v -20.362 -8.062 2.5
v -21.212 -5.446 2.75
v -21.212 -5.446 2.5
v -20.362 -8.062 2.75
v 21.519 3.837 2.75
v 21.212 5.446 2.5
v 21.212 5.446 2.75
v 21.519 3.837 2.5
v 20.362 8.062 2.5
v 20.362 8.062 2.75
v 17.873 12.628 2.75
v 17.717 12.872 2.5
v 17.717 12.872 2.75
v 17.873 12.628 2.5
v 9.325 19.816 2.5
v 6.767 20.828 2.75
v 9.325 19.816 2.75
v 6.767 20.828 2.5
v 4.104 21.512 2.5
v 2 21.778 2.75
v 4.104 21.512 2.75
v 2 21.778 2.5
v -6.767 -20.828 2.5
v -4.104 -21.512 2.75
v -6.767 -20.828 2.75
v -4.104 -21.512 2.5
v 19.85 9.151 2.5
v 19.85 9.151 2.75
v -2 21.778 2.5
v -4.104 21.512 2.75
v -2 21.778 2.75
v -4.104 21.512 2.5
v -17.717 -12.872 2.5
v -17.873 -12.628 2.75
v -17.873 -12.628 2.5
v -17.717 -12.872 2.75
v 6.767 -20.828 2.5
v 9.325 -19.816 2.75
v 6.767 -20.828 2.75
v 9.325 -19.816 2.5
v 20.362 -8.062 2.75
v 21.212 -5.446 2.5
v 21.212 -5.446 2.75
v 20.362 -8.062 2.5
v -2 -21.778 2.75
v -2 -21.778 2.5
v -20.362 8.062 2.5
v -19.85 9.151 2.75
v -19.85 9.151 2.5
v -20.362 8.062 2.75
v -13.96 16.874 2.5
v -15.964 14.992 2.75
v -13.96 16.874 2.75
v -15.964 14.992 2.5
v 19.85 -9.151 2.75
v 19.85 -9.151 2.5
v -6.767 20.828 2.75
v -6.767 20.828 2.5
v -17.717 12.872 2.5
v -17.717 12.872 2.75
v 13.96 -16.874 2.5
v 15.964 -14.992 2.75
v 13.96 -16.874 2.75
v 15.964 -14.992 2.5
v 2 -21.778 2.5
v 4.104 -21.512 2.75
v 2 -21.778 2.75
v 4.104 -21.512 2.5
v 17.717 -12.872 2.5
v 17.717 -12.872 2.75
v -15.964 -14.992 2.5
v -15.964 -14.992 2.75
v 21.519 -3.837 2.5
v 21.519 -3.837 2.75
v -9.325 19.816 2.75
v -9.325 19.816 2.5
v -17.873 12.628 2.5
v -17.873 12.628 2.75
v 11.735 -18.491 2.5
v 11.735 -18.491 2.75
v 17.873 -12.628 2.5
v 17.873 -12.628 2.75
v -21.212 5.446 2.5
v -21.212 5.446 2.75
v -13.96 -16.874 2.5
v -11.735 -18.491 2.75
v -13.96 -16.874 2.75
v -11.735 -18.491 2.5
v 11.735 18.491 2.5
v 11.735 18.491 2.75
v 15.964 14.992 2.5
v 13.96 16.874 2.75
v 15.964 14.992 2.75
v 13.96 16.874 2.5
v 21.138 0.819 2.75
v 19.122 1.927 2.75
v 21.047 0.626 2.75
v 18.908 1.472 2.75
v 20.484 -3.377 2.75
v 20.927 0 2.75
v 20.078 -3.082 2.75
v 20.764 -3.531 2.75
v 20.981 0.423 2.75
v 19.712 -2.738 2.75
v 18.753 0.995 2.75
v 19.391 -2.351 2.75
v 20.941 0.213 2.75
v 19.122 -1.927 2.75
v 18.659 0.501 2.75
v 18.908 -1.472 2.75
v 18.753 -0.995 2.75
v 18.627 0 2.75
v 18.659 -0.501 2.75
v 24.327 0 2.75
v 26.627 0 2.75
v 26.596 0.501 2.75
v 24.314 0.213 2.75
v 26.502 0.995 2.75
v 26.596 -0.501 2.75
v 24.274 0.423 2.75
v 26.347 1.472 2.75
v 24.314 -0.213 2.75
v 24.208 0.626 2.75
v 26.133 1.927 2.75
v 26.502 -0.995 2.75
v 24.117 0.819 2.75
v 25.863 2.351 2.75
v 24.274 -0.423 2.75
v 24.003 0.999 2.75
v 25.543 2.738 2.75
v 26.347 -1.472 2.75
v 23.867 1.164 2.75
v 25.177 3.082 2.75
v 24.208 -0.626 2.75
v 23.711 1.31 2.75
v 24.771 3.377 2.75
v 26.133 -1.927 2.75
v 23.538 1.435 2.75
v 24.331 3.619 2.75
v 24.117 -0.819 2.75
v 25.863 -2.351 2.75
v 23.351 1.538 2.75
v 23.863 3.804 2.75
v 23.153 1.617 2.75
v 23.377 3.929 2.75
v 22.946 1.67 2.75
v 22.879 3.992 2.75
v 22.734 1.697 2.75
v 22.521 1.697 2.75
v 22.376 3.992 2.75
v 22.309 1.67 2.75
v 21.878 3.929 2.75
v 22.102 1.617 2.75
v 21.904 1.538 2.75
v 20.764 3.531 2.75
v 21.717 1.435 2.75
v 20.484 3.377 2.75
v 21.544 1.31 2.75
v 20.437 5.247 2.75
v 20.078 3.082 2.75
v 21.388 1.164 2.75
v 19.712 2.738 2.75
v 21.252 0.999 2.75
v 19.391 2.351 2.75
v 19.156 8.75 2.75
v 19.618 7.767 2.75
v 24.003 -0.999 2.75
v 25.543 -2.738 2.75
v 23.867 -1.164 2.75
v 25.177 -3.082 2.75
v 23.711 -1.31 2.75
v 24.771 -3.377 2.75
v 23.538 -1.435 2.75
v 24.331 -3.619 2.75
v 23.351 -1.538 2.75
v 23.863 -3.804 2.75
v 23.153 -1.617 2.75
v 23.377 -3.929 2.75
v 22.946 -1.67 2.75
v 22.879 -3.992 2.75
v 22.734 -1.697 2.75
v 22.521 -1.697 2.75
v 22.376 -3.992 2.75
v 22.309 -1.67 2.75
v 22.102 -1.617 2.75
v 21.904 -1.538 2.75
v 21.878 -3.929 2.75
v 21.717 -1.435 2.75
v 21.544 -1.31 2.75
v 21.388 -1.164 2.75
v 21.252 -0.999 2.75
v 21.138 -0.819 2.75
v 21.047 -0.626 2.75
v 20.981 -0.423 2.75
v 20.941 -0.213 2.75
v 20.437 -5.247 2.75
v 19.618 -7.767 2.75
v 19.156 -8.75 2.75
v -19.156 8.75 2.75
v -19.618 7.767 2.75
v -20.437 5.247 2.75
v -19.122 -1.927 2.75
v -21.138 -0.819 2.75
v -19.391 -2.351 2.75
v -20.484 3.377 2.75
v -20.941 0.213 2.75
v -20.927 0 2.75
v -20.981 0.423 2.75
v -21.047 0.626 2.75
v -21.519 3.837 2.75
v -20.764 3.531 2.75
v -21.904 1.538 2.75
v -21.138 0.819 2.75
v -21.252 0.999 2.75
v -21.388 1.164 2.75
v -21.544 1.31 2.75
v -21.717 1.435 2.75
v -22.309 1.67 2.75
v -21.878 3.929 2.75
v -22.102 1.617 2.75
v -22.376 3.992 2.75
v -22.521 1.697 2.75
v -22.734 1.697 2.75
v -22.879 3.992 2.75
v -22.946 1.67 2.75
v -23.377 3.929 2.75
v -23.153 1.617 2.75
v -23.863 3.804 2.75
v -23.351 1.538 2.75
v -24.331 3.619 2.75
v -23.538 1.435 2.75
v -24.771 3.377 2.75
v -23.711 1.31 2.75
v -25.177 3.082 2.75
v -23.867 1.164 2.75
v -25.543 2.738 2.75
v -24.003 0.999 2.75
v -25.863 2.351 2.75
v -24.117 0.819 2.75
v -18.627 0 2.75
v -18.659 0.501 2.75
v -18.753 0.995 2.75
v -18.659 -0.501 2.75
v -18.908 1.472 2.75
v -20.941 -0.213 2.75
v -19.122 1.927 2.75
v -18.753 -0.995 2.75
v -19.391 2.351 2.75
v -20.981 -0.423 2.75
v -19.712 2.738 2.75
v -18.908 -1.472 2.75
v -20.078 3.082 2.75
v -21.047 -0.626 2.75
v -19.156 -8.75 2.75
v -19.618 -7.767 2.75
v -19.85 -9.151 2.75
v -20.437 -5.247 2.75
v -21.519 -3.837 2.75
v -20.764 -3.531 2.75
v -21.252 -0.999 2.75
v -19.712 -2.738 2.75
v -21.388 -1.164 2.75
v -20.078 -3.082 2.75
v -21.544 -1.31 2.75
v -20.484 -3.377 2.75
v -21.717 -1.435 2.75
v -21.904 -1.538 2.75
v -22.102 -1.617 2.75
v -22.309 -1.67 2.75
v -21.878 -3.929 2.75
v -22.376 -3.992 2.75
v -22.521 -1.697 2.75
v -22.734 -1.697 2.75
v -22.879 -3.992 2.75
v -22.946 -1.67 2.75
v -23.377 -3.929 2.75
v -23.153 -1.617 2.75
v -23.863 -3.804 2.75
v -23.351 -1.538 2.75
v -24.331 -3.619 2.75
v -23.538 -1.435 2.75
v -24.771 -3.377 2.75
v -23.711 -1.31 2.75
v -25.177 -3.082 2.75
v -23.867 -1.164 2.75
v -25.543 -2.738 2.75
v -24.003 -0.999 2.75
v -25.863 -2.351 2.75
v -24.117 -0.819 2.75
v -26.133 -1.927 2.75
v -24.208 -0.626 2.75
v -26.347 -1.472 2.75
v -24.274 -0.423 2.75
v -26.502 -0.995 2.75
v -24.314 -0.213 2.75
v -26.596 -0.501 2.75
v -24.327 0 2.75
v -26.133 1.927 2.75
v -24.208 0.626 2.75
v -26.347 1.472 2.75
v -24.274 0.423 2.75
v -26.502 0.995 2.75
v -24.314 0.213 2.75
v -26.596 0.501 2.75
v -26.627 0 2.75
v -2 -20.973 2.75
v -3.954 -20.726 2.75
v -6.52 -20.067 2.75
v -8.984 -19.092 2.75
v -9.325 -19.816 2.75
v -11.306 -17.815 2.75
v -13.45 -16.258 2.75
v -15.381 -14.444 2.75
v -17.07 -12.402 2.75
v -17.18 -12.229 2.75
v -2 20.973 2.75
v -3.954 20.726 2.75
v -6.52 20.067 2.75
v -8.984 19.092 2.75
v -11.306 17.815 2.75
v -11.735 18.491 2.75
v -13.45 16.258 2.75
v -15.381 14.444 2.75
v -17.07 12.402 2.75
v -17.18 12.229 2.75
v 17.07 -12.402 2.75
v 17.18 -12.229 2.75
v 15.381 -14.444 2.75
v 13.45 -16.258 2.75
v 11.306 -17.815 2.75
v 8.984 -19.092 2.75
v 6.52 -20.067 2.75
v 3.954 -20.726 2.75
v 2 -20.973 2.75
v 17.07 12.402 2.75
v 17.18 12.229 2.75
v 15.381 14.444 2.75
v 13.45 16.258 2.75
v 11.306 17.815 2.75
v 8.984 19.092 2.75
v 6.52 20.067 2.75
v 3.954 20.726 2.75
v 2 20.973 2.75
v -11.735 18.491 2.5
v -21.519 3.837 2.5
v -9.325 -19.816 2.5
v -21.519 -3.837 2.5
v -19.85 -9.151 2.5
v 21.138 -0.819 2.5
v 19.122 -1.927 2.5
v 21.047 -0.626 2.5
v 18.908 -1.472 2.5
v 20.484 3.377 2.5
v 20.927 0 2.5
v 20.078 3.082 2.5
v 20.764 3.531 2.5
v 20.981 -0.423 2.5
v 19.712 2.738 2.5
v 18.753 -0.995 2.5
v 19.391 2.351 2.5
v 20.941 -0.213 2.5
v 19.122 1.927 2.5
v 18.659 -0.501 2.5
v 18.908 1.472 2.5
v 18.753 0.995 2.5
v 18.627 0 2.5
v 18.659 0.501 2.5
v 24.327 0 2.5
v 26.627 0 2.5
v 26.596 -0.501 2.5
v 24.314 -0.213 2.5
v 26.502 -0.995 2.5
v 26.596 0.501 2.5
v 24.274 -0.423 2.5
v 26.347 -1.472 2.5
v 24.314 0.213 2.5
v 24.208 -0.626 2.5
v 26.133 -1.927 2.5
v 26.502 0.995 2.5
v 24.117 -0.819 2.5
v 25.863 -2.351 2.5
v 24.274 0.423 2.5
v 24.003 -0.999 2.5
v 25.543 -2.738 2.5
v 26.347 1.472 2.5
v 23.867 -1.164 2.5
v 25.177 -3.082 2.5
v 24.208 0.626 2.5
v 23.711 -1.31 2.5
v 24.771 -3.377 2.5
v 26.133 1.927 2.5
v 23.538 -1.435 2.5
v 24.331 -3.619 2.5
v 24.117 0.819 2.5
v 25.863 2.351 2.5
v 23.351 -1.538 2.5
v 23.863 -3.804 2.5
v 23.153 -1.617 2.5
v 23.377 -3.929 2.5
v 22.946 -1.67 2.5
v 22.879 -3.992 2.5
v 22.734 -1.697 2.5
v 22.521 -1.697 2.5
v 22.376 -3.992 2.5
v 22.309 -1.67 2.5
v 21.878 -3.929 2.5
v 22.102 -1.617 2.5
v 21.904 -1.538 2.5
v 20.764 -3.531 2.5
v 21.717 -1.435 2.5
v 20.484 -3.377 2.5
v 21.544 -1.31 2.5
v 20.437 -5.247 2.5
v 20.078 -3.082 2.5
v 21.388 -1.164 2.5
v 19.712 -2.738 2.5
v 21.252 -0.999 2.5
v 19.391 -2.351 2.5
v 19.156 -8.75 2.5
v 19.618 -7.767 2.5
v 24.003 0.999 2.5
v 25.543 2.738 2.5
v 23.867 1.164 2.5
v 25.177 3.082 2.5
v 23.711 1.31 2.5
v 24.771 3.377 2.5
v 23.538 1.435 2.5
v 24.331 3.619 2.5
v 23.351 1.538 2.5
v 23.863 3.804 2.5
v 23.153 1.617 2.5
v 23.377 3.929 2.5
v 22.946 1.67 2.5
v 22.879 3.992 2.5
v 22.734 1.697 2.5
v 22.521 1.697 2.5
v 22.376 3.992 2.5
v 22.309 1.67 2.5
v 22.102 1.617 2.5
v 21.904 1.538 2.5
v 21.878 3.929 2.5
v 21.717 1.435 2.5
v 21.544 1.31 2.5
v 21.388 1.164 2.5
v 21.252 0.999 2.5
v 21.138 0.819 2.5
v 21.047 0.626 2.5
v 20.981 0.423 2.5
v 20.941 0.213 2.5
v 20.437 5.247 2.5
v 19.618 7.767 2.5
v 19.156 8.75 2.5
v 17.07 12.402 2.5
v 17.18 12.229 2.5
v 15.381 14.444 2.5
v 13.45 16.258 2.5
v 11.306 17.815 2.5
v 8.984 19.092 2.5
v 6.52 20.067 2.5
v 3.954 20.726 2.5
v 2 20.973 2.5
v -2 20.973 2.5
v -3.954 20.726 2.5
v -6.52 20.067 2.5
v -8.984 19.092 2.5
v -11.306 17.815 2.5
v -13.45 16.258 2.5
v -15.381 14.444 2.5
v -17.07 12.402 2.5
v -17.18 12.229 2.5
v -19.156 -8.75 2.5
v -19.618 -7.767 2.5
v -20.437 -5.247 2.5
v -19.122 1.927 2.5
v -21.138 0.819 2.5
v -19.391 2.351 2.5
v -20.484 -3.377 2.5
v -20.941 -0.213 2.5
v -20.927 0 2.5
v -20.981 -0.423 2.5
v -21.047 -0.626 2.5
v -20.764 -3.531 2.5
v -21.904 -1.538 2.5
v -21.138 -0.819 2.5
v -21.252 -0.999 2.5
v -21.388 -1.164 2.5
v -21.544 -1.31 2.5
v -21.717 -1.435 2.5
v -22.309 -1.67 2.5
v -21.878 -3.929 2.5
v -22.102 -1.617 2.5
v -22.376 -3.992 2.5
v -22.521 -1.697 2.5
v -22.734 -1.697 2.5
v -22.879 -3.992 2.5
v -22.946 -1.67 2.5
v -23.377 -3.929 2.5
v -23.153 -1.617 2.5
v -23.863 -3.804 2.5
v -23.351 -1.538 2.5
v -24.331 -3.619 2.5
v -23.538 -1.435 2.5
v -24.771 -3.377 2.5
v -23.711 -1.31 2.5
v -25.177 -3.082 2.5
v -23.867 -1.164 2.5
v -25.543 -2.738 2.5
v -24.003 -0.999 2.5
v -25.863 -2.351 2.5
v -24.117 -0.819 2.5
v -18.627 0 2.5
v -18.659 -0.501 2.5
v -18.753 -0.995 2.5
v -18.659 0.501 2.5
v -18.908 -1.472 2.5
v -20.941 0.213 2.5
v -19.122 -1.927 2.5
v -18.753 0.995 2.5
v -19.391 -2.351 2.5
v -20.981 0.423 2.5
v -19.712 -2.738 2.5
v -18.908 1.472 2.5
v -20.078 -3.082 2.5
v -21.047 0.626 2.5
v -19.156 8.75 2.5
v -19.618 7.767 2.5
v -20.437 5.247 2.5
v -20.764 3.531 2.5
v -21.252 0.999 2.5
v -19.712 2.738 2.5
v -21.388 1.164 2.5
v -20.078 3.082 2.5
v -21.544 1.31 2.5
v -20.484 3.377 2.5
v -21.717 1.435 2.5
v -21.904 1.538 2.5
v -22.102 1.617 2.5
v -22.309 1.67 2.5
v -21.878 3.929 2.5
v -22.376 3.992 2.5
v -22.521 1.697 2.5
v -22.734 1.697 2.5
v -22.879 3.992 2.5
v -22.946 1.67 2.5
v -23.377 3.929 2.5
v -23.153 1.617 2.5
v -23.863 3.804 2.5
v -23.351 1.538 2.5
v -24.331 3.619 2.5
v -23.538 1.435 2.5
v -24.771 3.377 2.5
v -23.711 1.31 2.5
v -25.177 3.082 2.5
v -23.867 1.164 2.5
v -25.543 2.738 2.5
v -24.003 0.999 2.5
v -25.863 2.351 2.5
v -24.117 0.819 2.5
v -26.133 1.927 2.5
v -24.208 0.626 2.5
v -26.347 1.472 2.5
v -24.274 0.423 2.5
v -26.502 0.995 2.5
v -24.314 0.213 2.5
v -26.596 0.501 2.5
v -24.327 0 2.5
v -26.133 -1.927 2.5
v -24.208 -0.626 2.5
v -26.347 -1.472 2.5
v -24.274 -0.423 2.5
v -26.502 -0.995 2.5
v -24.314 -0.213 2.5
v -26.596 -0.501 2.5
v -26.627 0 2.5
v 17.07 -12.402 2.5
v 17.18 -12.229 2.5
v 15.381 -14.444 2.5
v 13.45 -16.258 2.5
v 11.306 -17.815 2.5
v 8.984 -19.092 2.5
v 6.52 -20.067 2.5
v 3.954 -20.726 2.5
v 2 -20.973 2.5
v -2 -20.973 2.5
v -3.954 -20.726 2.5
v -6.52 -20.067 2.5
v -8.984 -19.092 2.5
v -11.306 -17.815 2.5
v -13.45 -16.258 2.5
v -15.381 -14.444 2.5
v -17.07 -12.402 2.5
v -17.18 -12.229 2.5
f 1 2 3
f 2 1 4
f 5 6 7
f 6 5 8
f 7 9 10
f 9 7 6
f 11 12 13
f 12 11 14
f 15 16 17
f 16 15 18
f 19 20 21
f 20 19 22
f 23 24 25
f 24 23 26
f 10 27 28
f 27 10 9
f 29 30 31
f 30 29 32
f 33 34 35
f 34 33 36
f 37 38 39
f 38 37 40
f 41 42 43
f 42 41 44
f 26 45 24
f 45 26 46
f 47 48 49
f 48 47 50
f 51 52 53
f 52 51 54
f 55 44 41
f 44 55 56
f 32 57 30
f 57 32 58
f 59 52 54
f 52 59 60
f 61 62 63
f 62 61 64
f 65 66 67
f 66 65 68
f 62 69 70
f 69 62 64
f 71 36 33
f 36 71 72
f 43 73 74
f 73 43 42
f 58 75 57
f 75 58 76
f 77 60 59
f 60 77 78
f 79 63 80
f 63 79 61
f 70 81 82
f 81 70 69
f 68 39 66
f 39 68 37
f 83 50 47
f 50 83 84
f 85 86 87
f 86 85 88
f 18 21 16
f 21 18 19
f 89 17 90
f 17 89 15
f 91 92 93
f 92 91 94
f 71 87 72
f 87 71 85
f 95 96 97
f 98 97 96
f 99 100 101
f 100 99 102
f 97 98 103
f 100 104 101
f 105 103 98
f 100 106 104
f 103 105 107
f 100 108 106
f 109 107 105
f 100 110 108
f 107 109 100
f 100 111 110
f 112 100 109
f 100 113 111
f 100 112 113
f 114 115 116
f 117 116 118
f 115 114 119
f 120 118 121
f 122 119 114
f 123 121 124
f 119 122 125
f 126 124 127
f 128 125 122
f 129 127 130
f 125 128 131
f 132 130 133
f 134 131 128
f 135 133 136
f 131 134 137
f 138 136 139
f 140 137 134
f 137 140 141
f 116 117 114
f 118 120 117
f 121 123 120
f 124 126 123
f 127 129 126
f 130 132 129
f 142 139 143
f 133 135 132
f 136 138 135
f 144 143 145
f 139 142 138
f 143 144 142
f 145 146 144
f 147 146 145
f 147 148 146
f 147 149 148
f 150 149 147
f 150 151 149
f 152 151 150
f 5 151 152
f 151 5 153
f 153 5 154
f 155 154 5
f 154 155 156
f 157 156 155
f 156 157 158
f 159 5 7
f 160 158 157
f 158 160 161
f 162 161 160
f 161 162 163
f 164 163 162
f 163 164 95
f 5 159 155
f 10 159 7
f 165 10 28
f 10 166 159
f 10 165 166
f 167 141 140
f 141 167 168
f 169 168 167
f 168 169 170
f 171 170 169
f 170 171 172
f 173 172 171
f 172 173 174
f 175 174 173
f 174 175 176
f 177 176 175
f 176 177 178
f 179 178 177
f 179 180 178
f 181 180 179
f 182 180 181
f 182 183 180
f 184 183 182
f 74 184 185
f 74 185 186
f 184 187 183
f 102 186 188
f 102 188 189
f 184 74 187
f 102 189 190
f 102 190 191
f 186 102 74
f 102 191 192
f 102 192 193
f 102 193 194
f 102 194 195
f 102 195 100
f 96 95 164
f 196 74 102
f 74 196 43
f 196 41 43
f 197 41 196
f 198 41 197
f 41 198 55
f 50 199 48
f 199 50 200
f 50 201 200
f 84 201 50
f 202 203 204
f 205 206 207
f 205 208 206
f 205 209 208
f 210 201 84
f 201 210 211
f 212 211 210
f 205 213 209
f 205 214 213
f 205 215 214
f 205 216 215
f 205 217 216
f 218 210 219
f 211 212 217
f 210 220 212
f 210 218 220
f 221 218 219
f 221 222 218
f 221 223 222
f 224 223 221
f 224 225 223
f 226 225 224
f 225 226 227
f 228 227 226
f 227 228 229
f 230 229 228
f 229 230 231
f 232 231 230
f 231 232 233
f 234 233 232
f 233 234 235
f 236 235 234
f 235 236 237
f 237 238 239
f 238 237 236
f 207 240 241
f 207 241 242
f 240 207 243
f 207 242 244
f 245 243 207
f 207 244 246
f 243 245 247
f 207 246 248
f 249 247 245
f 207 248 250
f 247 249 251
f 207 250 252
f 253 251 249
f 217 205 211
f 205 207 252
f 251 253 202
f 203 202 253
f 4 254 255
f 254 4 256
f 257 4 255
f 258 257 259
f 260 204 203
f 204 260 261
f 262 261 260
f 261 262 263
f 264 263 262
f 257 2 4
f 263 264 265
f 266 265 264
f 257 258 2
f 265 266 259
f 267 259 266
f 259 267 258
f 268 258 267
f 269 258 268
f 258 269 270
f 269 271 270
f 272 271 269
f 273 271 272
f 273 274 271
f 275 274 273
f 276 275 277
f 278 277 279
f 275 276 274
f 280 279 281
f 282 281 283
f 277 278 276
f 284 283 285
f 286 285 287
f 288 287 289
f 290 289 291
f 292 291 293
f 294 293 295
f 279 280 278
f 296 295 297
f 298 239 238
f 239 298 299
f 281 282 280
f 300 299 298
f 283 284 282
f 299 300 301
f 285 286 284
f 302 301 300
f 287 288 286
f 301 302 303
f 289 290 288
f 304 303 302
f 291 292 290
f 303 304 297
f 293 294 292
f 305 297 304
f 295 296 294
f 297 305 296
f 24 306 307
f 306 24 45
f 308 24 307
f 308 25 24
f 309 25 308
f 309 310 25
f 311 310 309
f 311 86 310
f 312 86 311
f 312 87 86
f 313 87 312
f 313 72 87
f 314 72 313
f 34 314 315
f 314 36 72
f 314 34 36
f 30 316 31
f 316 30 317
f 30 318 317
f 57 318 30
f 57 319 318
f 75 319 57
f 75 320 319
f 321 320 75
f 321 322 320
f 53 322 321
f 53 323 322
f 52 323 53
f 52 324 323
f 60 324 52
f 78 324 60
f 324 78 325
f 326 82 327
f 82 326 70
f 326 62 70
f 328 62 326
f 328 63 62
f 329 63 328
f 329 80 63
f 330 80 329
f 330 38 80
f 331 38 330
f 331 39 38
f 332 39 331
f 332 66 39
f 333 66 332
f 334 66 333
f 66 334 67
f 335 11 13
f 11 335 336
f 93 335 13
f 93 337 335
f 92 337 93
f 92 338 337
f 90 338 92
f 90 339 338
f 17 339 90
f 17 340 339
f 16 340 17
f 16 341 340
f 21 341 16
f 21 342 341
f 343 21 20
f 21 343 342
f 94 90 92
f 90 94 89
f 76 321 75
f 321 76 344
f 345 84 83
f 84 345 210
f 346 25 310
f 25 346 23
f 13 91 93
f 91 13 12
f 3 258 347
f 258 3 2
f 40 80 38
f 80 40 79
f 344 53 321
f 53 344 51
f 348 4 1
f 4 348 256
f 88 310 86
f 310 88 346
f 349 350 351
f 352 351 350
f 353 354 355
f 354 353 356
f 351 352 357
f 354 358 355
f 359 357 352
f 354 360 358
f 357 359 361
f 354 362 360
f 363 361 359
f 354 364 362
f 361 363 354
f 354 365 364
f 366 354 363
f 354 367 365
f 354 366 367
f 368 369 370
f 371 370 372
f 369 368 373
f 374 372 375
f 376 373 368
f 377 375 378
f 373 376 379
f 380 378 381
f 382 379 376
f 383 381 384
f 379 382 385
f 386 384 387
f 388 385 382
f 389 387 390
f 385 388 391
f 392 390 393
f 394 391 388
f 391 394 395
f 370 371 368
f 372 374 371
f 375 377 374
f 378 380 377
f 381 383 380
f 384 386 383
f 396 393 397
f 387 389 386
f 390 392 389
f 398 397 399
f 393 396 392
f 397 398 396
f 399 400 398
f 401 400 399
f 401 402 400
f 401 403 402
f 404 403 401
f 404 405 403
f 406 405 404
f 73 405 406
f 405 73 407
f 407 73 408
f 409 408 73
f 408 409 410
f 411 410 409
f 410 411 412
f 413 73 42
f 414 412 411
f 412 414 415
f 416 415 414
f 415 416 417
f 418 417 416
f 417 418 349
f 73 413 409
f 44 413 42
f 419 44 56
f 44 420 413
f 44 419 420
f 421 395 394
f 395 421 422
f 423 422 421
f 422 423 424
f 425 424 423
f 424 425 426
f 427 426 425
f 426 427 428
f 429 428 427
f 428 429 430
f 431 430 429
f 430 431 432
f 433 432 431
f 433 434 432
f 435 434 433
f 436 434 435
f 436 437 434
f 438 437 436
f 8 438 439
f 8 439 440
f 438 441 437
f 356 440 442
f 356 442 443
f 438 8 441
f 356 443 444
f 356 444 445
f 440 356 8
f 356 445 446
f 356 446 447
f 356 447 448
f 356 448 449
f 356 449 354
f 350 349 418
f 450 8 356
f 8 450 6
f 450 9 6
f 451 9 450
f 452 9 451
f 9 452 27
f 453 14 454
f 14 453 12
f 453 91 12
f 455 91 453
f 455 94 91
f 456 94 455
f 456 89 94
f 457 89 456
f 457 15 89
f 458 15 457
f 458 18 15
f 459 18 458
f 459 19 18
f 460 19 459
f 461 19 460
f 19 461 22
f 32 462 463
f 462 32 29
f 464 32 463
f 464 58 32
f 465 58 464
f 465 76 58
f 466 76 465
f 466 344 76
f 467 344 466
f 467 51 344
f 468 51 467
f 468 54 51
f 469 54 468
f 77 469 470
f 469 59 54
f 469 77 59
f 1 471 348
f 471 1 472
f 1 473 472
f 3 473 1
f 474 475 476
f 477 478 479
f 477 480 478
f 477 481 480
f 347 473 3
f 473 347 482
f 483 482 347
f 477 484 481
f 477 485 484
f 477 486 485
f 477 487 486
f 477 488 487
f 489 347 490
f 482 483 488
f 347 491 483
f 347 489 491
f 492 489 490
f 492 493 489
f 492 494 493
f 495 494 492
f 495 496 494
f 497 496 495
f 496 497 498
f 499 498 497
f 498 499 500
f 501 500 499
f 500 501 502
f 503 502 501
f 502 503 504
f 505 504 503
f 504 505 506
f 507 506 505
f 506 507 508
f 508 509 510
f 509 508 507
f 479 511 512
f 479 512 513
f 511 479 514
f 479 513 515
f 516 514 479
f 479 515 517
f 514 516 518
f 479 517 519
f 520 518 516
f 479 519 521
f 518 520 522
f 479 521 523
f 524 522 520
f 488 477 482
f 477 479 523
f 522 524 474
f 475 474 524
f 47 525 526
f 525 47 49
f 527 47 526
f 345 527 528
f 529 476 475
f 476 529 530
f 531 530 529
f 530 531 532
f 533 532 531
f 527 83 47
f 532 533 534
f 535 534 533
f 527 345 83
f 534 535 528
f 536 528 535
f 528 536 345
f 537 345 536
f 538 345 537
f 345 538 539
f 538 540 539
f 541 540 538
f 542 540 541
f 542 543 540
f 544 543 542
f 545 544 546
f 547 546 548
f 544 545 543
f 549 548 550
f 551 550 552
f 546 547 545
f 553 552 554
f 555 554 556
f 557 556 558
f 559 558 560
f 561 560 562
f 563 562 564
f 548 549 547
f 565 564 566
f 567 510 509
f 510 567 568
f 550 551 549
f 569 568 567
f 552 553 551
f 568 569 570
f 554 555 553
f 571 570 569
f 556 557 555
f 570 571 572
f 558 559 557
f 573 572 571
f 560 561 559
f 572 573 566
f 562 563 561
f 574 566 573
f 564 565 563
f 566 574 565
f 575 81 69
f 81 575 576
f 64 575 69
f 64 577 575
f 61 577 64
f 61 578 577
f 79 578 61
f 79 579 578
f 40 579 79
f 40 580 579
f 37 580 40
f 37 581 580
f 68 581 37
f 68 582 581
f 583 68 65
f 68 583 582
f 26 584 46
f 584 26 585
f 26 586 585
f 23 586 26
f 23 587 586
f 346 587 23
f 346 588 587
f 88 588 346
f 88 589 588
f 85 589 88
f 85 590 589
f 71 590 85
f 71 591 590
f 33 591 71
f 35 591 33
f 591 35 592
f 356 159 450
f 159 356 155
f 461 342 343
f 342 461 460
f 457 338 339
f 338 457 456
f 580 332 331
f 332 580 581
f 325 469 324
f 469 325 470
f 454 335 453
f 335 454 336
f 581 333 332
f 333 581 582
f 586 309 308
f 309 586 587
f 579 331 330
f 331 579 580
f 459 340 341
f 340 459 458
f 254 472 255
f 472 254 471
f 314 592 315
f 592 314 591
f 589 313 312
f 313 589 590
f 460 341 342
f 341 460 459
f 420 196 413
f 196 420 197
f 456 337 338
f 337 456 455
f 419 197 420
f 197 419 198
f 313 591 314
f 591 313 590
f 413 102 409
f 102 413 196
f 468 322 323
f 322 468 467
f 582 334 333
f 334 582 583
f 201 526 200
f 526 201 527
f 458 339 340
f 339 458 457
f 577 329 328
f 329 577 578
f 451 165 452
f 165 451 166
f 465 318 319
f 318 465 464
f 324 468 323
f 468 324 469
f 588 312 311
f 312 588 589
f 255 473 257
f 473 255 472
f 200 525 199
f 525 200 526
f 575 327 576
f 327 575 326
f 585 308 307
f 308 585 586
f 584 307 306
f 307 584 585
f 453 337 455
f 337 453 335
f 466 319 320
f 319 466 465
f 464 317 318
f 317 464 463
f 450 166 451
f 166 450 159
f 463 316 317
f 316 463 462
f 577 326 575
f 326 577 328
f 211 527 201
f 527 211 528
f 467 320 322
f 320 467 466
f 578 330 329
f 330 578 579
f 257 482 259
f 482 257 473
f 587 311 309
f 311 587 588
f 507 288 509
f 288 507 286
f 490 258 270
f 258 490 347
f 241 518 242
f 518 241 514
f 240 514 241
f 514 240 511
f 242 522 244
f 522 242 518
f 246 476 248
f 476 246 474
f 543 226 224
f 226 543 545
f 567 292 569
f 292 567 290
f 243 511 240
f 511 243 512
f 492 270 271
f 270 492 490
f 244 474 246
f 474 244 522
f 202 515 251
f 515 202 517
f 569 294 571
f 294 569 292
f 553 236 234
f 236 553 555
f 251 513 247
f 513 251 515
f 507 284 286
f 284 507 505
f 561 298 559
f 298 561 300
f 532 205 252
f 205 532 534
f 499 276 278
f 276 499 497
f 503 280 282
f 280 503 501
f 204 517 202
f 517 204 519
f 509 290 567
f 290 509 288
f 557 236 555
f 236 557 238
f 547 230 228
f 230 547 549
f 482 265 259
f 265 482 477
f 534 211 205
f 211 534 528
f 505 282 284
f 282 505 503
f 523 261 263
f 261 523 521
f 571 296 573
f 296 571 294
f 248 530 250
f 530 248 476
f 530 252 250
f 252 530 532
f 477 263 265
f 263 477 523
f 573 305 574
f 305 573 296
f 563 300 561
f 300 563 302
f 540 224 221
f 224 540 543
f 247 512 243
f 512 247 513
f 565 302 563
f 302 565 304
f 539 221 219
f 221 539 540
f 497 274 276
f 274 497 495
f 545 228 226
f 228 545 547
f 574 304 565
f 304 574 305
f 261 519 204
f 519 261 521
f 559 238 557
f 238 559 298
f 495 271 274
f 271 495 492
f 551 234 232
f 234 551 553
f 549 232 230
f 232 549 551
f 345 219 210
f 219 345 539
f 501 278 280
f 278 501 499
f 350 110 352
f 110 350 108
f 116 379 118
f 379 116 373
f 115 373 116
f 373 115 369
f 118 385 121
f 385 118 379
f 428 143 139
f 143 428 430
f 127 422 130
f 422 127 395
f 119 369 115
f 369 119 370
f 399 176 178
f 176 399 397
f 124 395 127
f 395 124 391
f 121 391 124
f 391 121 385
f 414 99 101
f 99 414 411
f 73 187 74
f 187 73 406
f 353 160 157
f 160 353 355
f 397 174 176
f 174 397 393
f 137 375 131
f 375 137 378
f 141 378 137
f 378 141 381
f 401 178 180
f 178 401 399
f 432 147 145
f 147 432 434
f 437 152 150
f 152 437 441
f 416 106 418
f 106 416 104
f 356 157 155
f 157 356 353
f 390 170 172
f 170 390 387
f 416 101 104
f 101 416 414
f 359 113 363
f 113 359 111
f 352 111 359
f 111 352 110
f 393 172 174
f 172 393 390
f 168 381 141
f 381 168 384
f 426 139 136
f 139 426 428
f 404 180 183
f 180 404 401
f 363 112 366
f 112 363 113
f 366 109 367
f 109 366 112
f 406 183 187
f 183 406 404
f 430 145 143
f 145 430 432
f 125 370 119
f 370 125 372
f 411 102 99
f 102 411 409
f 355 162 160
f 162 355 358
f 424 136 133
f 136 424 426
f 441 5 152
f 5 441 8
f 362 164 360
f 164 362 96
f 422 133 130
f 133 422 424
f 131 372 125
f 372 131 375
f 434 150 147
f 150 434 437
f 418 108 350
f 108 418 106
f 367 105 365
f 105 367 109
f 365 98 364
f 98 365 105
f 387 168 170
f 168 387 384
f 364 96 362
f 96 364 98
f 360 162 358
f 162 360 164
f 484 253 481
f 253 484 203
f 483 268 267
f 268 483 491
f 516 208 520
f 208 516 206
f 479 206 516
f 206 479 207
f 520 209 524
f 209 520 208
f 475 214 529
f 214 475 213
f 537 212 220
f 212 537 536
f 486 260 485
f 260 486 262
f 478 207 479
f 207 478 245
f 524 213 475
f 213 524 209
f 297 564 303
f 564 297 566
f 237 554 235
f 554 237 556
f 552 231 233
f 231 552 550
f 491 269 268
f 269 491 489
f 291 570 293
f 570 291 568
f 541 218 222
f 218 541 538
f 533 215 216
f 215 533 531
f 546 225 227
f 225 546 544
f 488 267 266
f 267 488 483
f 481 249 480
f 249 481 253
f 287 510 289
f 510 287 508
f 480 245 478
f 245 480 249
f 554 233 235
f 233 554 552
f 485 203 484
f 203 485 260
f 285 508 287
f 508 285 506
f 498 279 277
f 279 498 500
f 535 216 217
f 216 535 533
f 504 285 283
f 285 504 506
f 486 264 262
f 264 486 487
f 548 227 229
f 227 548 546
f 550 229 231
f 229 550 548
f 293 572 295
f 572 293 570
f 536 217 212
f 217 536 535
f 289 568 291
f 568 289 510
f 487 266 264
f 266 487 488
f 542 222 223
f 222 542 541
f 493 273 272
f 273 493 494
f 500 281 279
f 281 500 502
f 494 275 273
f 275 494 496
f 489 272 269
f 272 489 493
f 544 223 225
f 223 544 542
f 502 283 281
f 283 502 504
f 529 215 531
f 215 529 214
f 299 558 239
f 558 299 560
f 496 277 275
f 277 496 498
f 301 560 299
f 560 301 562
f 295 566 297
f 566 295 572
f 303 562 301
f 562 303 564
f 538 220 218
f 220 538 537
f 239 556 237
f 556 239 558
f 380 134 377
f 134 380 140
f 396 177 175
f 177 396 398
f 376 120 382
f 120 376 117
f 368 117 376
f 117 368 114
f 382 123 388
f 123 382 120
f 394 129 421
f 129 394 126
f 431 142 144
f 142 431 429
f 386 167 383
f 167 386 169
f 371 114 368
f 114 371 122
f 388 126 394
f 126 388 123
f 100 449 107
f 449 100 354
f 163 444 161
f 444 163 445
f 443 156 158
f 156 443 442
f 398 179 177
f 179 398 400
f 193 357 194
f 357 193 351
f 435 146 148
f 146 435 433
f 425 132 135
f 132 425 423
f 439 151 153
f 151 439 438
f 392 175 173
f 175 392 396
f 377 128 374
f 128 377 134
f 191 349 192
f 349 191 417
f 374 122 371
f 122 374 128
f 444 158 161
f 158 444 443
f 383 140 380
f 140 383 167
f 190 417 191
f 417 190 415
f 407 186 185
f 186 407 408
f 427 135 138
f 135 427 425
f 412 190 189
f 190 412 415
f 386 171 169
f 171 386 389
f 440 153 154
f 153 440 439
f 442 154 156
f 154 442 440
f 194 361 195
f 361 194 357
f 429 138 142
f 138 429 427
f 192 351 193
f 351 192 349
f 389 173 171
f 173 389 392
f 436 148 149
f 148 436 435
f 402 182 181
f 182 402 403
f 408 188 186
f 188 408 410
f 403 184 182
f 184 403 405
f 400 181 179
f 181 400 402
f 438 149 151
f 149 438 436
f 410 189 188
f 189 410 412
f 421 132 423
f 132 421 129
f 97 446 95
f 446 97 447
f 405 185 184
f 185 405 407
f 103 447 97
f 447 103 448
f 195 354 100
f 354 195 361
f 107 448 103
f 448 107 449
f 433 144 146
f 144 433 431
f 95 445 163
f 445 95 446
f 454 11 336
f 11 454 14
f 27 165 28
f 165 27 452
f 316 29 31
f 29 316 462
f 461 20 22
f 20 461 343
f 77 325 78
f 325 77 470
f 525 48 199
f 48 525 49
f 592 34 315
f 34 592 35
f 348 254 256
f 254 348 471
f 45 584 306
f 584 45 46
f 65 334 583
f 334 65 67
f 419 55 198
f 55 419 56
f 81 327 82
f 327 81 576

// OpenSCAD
// Smoooooooth
$fn = 50;

ring_height = 2.5;
ring_dia_out = 48;
ring_dia_in = 36;
screw_offset = sqrt(16*16+16*16);
circuit_height = 0.25;
circuit_width = 0.8;

//led_ring_base();
translate([0, 0, ring_height]) led_ring_circuit();
//led_smd_7262();

module led_ring_base() {
	difference() {
		union() {
			cylinder(r=ring_dia_out/2, h=ring_height, center=false);
			for(k=[-1, 1]) {
				translate([k*screw_offset, 0, 0]) cylinder(r=4.5, h=ring_height, center=false);
			}
		}
		//center
		cylinder(r=ring_dia_in/2, h=ring_height*2+1, center=true);
		//mount screws
		for(k=[-1,1]) {
			translate([k*screw_offset, 0, 0]) cylinder(r=1.7, h=20, center=true);
		}
	}
}

module led_ring_circuit() {
	difference() {
		union() {
			//led bodys
			for(i=[0:5]) {
				%rotate([0, 0, 60*i+30]) translate([(ring_dia_in+ring_dia_out)/4, 0, 0]) led_smd_7262();
			}
			//main wire
			difference() {
				cylinder(r=(ring_dia_out+ring_dia_in)/4+circuit_width/2+0.5, h=circuit_height, center=false);
				cylinder(r=(ring_dia_out+ring_dia_in)/4-circuit_width/2+0.5, h=3*circuit_height, center=true);
			}
			//screw connectors
			for(i=[-1, 1]) {
				translate([i*screw_offset, 0, 0]) cylinder(r=4, h=circuit_height, center=false);
			}
		}
		//mount screws
		for(i=[-1, 1]) {
			translate([i*screw_offset, 0, 0]) {
				difference() cylinder(r=1.7, h=3*circuit_height, center=true);
			}
		}
		//main wire interruptions
		for(i=[0:5]) {
			rotate([0, 0, 60*i+30]) translate([(ring_dia_in+ring_dia_out)/4, 0, 0]) cube(size=[10, 4, 10], center=true);
		}
	}
}

module led_smd_7262() {
	union() {
		//body
		translate([0, 0, 3.1/2]) cube(size=[6.2, 7.2, 3.1], center=true);
		//pads
		translate([0, 0, 0.5]) cube(size=[1.9, 11.2, 1], center=true);
	}
}
